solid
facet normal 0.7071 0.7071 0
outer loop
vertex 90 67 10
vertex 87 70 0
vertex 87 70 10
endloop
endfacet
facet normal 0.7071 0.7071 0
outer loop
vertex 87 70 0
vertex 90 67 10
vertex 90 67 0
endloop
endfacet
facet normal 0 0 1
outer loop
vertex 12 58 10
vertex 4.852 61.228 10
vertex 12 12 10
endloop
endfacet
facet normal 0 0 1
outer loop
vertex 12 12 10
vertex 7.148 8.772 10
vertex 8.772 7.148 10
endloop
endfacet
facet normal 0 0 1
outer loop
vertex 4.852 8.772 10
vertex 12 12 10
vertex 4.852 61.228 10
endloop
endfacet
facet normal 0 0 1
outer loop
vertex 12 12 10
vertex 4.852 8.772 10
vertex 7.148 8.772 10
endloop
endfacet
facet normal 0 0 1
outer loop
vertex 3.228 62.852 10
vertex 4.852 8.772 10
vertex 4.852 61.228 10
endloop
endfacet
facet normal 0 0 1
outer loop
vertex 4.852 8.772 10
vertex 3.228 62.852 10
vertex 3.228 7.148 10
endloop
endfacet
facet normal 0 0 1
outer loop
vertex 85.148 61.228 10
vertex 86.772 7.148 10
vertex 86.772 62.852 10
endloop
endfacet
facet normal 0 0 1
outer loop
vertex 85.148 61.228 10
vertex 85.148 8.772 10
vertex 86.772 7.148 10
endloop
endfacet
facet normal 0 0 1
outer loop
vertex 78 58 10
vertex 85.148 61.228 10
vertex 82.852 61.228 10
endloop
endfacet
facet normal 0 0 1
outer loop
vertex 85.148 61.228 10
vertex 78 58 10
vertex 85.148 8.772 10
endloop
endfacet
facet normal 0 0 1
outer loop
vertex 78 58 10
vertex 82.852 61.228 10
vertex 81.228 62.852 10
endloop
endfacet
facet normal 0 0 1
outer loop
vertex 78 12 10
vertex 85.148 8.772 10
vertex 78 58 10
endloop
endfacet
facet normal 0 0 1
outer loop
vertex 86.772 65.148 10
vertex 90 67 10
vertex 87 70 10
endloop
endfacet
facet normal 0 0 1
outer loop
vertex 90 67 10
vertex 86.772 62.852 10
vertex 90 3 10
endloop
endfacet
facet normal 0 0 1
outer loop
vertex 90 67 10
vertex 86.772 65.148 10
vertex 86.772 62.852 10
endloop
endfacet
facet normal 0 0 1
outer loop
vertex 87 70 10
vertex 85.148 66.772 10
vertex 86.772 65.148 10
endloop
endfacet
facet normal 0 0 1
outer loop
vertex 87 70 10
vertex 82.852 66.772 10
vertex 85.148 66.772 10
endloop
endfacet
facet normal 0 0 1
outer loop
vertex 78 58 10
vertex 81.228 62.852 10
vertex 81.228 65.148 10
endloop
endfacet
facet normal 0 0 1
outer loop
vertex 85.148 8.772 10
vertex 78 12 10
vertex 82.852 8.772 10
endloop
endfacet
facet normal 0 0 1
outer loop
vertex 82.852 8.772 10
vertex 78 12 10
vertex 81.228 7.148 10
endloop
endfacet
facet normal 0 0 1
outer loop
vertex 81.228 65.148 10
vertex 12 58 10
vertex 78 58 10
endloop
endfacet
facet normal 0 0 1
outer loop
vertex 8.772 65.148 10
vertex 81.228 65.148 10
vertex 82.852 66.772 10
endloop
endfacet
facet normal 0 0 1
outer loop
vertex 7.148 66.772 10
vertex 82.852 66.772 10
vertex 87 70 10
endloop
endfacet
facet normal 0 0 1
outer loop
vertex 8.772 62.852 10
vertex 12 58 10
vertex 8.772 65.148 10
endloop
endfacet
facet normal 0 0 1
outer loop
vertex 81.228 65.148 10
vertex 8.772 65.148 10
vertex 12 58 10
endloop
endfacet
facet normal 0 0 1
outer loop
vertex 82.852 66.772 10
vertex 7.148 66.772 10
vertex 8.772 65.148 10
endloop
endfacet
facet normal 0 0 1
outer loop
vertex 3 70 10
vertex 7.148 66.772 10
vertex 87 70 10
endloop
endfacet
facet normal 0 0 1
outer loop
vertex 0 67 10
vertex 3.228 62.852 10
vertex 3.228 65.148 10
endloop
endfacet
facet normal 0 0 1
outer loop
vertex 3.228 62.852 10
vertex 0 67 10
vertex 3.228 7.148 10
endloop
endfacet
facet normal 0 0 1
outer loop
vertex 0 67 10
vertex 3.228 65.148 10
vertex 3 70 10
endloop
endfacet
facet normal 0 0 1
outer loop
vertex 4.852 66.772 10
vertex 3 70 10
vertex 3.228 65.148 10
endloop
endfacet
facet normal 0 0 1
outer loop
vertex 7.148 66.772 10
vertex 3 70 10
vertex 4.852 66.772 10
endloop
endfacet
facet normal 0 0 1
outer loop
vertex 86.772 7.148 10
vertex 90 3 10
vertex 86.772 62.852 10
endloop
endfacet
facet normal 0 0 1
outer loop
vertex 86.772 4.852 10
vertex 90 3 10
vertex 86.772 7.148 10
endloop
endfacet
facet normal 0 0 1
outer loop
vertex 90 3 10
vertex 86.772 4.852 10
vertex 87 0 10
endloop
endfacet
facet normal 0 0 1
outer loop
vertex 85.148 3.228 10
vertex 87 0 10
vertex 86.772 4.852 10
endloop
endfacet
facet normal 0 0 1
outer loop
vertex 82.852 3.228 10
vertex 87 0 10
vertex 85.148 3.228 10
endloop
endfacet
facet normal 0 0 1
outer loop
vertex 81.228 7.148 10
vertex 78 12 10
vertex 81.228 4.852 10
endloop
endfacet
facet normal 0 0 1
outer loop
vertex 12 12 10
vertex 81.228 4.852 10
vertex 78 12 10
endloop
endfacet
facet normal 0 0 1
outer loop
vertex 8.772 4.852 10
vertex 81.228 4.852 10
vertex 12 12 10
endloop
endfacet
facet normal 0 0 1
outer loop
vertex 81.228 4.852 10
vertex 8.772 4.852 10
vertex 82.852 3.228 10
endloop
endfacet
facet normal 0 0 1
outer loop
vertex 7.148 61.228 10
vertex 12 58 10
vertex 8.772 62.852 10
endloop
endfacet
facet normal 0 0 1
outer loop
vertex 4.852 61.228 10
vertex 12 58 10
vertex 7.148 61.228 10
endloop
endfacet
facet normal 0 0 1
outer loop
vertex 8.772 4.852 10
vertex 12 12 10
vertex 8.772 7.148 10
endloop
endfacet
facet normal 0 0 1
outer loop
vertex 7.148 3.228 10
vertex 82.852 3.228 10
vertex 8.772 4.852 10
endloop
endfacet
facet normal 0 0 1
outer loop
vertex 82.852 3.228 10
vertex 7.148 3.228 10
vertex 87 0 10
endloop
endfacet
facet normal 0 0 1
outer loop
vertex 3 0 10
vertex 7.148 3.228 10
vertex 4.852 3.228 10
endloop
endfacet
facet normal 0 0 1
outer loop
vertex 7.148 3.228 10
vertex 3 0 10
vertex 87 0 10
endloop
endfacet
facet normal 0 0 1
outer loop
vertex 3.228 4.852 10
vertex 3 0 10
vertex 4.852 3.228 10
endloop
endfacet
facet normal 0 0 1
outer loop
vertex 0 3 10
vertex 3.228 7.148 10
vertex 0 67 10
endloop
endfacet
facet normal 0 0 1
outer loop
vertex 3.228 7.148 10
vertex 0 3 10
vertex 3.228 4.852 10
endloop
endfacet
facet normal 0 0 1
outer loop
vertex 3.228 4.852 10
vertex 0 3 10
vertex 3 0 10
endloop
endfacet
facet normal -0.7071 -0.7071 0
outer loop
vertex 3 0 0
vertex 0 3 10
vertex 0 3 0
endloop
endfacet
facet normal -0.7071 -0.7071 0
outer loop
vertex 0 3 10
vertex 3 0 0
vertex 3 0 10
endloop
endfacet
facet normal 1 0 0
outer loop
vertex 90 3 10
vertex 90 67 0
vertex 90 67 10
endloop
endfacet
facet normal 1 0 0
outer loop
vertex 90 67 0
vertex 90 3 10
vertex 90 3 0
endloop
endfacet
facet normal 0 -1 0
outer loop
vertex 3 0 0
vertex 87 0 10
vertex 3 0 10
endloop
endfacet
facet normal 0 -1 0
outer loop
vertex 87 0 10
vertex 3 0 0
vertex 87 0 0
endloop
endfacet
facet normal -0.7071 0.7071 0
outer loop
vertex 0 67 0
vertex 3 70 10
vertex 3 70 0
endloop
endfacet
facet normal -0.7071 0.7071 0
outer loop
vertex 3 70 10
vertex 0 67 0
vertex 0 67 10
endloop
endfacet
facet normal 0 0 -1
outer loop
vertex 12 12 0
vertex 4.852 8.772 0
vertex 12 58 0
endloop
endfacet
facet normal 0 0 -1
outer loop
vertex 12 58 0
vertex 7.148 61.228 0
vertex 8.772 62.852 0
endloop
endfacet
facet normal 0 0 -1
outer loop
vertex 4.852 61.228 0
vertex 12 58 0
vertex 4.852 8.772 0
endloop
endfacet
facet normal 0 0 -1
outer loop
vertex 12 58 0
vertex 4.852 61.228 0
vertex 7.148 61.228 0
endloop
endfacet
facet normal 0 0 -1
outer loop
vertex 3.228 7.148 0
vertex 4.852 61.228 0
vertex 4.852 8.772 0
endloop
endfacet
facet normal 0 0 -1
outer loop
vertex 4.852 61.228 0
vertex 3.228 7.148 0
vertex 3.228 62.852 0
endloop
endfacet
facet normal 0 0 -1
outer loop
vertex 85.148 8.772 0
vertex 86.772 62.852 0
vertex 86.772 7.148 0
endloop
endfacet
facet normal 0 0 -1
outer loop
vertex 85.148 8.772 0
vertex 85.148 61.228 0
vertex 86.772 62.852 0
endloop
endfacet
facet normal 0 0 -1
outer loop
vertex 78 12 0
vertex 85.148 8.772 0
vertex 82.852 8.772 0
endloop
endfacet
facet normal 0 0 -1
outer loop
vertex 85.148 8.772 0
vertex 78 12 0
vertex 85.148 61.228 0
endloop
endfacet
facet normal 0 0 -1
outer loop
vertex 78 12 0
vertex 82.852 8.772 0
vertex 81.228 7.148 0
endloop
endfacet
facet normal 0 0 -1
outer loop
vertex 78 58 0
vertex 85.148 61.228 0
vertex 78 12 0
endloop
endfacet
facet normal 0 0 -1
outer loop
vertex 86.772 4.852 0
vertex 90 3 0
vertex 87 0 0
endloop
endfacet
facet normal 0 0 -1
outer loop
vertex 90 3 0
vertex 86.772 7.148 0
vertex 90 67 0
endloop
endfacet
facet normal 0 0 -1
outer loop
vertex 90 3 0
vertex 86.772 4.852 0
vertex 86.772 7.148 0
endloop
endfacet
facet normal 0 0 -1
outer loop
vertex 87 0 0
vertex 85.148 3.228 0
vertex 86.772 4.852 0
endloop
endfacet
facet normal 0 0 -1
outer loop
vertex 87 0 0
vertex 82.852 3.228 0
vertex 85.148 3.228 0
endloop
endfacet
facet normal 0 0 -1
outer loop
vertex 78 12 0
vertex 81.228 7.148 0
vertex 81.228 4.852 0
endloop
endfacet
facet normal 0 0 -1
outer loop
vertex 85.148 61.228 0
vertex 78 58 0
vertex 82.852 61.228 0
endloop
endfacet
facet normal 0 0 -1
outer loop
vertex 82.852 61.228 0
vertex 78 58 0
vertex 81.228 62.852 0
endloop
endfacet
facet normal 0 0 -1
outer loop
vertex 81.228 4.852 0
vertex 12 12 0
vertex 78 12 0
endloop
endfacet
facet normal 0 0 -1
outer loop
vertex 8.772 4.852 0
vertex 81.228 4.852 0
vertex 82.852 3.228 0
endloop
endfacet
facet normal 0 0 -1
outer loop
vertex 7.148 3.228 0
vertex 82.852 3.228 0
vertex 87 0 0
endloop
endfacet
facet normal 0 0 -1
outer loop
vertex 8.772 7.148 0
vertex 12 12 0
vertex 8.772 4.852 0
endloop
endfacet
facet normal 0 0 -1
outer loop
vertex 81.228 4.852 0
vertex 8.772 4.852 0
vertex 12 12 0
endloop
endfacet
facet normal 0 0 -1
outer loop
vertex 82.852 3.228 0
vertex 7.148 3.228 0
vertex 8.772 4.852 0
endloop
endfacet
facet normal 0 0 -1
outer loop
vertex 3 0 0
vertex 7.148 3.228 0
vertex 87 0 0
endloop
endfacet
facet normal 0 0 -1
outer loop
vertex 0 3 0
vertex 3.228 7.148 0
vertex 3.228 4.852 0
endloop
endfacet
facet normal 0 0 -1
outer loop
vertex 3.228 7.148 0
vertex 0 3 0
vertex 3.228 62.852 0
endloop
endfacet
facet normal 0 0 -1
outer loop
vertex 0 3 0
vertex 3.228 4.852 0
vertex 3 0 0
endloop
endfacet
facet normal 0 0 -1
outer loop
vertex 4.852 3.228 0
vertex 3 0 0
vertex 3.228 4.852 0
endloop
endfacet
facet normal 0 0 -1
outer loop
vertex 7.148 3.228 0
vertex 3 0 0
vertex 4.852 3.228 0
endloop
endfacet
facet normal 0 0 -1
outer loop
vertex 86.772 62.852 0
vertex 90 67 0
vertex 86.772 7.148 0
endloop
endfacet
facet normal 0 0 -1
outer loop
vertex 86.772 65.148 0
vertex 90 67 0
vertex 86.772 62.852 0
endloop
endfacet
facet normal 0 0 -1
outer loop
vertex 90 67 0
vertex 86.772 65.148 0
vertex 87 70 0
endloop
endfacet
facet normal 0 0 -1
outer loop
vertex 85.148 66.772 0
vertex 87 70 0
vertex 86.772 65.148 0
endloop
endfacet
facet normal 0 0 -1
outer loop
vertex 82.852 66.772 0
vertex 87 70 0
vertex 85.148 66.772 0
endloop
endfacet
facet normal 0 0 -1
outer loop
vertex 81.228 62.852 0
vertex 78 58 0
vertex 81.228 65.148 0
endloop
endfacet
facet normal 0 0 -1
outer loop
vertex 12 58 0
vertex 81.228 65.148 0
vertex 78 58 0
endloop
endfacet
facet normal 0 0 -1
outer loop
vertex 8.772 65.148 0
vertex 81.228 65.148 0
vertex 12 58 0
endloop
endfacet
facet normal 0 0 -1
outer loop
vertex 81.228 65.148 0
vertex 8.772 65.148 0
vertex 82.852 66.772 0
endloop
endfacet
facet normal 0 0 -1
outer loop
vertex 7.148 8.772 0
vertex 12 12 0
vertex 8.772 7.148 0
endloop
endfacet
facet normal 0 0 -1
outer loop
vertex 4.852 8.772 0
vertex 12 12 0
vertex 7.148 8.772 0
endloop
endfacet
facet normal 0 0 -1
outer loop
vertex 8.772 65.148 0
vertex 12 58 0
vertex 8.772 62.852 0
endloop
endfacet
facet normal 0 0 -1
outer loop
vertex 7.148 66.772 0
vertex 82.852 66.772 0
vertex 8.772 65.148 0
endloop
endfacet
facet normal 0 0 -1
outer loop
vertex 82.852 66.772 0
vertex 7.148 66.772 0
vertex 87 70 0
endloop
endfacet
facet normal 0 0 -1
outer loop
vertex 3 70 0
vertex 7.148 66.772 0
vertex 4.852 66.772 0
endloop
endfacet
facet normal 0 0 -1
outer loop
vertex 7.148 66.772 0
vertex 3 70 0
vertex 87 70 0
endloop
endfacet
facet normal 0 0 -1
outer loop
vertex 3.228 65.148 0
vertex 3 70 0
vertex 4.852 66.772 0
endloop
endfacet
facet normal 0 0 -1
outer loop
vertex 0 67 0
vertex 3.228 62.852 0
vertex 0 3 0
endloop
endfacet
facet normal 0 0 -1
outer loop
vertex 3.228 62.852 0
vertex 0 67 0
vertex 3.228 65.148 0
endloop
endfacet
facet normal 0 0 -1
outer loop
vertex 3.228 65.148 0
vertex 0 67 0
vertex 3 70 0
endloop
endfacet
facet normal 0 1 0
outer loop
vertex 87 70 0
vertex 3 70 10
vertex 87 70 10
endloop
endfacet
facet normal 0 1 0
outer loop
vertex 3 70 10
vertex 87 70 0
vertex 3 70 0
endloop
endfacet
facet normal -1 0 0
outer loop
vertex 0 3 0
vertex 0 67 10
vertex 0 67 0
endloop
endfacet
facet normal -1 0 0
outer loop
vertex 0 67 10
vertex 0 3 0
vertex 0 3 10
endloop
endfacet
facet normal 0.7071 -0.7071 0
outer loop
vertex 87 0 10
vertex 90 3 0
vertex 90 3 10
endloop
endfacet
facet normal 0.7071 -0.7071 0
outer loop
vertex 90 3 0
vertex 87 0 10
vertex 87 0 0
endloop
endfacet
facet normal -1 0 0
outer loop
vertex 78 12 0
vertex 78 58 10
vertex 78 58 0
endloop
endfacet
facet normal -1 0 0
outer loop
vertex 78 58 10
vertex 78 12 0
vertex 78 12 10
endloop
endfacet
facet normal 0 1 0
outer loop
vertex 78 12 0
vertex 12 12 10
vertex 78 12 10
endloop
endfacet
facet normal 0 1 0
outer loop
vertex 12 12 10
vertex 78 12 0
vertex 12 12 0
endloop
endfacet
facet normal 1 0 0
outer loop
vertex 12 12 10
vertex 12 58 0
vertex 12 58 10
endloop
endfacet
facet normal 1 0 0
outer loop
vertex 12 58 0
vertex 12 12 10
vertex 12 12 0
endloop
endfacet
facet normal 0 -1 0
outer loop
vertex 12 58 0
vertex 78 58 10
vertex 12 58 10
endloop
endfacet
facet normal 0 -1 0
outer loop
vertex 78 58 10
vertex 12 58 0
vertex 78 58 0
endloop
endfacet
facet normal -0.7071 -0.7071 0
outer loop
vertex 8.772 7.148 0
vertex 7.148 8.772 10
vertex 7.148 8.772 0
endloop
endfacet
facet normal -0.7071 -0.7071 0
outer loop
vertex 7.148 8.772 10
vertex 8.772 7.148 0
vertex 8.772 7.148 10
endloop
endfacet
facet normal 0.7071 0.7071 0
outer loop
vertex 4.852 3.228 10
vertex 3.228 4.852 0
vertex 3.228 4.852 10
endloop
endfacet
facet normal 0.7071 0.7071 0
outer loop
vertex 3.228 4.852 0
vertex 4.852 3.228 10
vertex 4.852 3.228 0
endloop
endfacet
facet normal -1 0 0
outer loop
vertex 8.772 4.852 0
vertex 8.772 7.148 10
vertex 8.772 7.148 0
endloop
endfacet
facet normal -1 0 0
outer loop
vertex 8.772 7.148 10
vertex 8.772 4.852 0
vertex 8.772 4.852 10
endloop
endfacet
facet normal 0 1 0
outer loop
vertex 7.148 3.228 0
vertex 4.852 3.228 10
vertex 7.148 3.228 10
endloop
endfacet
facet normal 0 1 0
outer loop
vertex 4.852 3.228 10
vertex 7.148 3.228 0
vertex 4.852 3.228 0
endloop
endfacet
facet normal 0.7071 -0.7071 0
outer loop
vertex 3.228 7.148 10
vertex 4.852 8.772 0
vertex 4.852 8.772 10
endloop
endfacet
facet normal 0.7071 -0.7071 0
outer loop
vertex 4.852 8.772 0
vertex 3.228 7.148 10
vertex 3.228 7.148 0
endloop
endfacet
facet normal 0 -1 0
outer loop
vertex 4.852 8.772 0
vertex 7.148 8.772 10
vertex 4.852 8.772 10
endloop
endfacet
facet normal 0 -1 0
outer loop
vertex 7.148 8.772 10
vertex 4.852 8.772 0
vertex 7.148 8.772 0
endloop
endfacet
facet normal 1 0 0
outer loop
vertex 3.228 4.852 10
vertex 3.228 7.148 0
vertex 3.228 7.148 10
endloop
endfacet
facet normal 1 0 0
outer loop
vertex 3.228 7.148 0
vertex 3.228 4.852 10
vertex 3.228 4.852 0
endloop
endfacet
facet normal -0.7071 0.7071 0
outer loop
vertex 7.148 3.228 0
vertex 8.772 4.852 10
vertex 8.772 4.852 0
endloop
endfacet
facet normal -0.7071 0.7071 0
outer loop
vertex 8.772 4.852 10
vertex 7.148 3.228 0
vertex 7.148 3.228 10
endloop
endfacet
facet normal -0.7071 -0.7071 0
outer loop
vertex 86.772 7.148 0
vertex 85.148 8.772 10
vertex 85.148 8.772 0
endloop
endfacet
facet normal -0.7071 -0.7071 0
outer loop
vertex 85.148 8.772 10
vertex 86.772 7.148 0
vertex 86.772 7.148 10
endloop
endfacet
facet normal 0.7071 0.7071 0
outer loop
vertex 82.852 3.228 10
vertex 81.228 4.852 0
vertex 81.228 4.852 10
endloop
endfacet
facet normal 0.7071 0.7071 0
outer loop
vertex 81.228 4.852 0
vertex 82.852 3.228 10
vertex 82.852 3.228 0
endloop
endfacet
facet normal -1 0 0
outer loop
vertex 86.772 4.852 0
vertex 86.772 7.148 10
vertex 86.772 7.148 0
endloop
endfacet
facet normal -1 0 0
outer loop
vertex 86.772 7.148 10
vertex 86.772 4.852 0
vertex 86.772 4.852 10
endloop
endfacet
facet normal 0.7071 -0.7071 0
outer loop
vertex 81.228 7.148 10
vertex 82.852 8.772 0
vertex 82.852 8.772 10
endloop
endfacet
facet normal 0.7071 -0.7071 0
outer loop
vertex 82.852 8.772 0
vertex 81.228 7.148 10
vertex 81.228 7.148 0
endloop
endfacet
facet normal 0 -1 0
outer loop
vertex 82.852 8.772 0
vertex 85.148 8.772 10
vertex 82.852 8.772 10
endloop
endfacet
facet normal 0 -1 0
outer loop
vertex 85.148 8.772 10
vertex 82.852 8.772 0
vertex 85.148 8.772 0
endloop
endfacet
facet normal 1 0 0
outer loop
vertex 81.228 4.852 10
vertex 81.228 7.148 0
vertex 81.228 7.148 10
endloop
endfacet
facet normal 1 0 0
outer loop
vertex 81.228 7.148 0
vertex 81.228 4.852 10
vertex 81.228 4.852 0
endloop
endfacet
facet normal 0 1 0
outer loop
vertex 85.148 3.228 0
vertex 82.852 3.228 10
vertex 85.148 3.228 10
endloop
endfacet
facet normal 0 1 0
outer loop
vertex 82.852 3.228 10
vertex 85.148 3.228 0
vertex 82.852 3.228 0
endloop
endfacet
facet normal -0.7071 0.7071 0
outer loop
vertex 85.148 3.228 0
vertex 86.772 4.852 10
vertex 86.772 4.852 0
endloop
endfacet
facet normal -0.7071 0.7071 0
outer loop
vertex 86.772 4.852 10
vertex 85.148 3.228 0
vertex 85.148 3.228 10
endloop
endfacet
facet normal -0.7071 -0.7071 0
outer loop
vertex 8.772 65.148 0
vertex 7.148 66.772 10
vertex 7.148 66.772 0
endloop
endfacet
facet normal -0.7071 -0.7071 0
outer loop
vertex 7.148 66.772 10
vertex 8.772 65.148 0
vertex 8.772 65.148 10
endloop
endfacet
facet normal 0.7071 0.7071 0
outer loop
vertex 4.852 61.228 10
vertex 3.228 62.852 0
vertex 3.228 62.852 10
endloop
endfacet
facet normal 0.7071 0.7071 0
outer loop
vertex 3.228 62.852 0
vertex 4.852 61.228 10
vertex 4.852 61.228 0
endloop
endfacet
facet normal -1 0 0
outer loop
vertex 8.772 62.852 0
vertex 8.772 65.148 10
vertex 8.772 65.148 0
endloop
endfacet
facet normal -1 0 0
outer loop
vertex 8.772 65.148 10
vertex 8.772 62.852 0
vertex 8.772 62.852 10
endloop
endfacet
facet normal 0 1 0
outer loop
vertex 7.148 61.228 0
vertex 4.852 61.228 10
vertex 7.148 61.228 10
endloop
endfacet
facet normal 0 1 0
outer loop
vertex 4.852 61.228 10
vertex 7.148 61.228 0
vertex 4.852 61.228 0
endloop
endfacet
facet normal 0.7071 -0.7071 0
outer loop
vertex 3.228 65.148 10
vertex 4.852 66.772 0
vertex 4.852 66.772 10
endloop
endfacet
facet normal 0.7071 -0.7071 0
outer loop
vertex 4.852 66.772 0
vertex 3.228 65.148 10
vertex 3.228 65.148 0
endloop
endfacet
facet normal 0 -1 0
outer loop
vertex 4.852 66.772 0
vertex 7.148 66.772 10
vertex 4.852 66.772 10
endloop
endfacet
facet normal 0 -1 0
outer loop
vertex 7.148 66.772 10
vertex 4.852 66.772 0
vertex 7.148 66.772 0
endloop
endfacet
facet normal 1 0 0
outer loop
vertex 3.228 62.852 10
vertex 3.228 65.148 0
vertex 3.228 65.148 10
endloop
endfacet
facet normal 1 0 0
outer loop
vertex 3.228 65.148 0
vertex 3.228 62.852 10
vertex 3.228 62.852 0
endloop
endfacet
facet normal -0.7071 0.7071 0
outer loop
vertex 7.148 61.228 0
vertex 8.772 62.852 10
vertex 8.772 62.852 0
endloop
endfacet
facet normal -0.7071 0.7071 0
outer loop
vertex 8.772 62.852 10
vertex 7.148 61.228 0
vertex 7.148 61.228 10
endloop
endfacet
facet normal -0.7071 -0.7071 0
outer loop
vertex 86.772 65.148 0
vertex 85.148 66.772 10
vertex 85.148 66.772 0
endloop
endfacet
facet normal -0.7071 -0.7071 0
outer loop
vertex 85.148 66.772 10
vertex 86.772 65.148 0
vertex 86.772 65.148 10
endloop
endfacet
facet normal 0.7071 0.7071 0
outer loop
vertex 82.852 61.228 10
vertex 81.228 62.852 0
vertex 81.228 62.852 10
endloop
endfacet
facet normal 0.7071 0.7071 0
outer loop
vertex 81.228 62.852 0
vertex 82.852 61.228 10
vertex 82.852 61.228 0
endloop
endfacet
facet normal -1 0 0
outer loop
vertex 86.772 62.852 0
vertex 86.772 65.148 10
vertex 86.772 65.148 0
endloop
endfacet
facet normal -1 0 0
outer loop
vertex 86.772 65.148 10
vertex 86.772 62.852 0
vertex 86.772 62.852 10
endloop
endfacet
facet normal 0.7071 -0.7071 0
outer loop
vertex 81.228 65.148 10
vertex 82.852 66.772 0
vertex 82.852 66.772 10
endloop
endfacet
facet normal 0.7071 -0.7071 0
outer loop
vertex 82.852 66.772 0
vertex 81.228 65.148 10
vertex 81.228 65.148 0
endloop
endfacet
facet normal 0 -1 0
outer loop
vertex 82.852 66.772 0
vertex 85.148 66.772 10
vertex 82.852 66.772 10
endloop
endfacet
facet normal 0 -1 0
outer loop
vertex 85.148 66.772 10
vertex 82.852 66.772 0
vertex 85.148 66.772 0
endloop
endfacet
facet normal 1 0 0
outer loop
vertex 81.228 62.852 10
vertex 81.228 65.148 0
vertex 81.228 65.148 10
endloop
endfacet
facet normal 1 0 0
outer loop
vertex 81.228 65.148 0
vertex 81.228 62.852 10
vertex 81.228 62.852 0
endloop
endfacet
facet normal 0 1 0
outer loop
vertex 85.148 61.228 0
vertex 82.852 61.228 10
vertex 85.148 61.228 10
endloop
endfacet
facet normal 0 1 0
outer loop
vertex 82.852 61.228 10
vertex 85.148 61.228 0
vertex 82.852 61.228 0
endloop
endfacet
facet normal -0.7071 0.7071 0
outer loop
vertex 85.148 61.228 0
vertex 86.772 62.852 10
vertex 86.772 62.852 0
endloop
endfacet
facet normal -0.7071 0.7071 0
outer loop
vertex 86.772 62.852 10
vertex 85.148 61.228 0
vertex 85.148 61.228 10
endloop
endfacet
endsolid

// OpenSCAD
$fn = 32;

// ----------------------------------------------------------------------
// Frame plate: 90 x 70 frame, 12 mm rails
// ----------------------------------------------------------------------

// --- parameters (mm) ---
plate_l = 90;             // plate length, X
plate_w = 70;             // plate width, Y
plate_t = 10;             // plate thickness, Z (extrusion height)
corner_c = 3;             // corner chamfer
frame_bar = 12;           // frame rail width
bolt_r = 3;               // corner bolt window radius
bolt_inset = 6;           // bolt centre inset from the edges

win_l = plate_l - 2 * frame_bar;  // window length
win_w = plate_w - 2 * frame_bar;  // window width
bolt_d = 2 * bolt_r;  // corner hole diameter

profile = [[3, 0], [87, 0], [90, 3], [90, 67], [87, 70], [3, 70], [0, 67], [0, 3]];  // primary outline, 8 points, counter clockwise
void_1 = [[12, 12], [78, 12], [78, 58], [12, 58]];  // the window, 4 points
void_2 = [[8.772, 7.148], [7.148, 8.772], [4.852, 8.772], [3.228, 7.148], [3.228, 4.852], [4.852, 3.228], [7.148, 3.228], [8.772, 4.852]];  // corner bolt window, 8 points
void_3 = [[86.772, 7.148], [85.148, 8.772], [82.852, 8.772], [81.228, 7.148], [81.228, 4.852], [82.852, 3.228], [85.148, 3.228], [86.772, 4.852]];  // corner bolt window, 8 points
void_4 = [[8.772, 65.148], [7.148, 66.772], [4.852, 66.772], [3.228, 65.148], [3.228, 62.852], [4.852, 61.228], [7.148, 61.228], [8.772, 62.852]];  // corner bolt window, 8 points
void_5 = [[86.772, 65.148], [85.148, 66.772], [82.852, 66.772], [81.228, 65.148], [81.228, 62.852], [82.852, 61.228], [85.148, 61.228], [86.772, 62.852]];  // corner bolt window, 8 points

// --- the one profile operation ---
difference() {
  linear_extrude(height = plate_t) polygon(points = profile);
  translate([0, 0, -1])
    linear_extrude(height = plate_t + 2) polygon(points = void_1);
  translate([0, 0, -1])
    linear_extrude(height = plate_t + 2) polygon(points = void_2);
  translate([0, 0, -1])
    linear_extrude(height = plate_t + 2) polygon(points = void_3);
  translate([0, 0, -1])
    linear_extrude(height = plate_t + 2) polygon(points = void_4);
  translate([0, 0, -1])
    linear_extrude(height = plate_t + 2) polygon(points = void_5);
}
